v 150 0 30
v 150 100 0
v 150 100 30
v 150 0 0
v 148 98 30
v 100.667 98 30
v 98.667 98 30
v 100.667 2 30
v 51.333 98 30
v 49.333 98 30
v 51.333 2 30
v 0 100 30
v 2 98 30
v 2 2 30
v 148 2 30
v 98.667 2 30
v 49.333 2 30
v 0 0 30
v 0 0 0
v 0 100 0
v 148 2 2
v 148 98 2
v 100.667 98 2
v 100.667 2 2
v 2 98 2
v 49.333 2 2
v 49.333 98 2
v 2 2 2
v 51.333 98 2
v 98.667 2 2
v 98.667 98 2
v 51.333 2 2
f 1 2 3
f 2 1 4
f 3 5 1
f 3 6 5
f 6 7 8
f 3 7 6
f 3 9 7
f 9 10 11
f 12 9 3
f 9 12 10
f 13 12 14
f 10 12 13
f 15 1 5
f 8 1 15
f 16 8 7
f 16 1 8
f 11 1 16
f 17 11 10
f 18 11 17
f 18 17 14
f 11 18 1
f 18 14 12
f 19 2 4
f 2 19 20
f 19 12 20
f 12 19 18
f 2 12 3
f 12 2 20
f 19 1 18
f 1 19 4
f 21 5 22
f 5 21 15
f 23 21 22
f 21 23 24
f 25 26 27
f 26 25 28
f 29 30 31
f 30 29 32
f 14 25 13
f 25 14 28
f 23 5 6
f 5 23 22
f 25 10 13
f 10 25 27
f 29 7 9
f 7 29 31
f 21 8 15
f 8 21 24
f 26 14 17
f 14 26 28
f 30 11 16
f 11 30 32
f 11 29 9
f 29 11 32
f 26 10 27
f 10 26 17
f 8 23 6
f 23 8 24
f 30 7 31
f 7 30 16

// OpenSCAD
// Parametric Tray/Organizer Template
// Tray with optional dividers

$fn = 32;

// Parameters
width = 150;       // mm
depth = 100;       // mm
height = 30;       // mm
wall = 2;          // mm
divider_count = 2; // number of dividers

// Base tray
module tray() {
    difference() {
        // Outer shell
        cube([width, depth, height]);
        
        // Inner cavity
        translate([wall, wall, wall])
            cube([width - 2*wall, depth - 2*wall, height]);
    }
}

// Dividers
module dividers() {
    if (divider_count > 0) {
        compartment_width = (width - wall) / (divider_count + 1);
        
        for (i = [1:divider_count]) {
            translate([i * compartment_width, wall, wall])
                cube([wall, depth - 2*wall, height - wall]);
        }
    }
}

// Render
tray();
dividers();
